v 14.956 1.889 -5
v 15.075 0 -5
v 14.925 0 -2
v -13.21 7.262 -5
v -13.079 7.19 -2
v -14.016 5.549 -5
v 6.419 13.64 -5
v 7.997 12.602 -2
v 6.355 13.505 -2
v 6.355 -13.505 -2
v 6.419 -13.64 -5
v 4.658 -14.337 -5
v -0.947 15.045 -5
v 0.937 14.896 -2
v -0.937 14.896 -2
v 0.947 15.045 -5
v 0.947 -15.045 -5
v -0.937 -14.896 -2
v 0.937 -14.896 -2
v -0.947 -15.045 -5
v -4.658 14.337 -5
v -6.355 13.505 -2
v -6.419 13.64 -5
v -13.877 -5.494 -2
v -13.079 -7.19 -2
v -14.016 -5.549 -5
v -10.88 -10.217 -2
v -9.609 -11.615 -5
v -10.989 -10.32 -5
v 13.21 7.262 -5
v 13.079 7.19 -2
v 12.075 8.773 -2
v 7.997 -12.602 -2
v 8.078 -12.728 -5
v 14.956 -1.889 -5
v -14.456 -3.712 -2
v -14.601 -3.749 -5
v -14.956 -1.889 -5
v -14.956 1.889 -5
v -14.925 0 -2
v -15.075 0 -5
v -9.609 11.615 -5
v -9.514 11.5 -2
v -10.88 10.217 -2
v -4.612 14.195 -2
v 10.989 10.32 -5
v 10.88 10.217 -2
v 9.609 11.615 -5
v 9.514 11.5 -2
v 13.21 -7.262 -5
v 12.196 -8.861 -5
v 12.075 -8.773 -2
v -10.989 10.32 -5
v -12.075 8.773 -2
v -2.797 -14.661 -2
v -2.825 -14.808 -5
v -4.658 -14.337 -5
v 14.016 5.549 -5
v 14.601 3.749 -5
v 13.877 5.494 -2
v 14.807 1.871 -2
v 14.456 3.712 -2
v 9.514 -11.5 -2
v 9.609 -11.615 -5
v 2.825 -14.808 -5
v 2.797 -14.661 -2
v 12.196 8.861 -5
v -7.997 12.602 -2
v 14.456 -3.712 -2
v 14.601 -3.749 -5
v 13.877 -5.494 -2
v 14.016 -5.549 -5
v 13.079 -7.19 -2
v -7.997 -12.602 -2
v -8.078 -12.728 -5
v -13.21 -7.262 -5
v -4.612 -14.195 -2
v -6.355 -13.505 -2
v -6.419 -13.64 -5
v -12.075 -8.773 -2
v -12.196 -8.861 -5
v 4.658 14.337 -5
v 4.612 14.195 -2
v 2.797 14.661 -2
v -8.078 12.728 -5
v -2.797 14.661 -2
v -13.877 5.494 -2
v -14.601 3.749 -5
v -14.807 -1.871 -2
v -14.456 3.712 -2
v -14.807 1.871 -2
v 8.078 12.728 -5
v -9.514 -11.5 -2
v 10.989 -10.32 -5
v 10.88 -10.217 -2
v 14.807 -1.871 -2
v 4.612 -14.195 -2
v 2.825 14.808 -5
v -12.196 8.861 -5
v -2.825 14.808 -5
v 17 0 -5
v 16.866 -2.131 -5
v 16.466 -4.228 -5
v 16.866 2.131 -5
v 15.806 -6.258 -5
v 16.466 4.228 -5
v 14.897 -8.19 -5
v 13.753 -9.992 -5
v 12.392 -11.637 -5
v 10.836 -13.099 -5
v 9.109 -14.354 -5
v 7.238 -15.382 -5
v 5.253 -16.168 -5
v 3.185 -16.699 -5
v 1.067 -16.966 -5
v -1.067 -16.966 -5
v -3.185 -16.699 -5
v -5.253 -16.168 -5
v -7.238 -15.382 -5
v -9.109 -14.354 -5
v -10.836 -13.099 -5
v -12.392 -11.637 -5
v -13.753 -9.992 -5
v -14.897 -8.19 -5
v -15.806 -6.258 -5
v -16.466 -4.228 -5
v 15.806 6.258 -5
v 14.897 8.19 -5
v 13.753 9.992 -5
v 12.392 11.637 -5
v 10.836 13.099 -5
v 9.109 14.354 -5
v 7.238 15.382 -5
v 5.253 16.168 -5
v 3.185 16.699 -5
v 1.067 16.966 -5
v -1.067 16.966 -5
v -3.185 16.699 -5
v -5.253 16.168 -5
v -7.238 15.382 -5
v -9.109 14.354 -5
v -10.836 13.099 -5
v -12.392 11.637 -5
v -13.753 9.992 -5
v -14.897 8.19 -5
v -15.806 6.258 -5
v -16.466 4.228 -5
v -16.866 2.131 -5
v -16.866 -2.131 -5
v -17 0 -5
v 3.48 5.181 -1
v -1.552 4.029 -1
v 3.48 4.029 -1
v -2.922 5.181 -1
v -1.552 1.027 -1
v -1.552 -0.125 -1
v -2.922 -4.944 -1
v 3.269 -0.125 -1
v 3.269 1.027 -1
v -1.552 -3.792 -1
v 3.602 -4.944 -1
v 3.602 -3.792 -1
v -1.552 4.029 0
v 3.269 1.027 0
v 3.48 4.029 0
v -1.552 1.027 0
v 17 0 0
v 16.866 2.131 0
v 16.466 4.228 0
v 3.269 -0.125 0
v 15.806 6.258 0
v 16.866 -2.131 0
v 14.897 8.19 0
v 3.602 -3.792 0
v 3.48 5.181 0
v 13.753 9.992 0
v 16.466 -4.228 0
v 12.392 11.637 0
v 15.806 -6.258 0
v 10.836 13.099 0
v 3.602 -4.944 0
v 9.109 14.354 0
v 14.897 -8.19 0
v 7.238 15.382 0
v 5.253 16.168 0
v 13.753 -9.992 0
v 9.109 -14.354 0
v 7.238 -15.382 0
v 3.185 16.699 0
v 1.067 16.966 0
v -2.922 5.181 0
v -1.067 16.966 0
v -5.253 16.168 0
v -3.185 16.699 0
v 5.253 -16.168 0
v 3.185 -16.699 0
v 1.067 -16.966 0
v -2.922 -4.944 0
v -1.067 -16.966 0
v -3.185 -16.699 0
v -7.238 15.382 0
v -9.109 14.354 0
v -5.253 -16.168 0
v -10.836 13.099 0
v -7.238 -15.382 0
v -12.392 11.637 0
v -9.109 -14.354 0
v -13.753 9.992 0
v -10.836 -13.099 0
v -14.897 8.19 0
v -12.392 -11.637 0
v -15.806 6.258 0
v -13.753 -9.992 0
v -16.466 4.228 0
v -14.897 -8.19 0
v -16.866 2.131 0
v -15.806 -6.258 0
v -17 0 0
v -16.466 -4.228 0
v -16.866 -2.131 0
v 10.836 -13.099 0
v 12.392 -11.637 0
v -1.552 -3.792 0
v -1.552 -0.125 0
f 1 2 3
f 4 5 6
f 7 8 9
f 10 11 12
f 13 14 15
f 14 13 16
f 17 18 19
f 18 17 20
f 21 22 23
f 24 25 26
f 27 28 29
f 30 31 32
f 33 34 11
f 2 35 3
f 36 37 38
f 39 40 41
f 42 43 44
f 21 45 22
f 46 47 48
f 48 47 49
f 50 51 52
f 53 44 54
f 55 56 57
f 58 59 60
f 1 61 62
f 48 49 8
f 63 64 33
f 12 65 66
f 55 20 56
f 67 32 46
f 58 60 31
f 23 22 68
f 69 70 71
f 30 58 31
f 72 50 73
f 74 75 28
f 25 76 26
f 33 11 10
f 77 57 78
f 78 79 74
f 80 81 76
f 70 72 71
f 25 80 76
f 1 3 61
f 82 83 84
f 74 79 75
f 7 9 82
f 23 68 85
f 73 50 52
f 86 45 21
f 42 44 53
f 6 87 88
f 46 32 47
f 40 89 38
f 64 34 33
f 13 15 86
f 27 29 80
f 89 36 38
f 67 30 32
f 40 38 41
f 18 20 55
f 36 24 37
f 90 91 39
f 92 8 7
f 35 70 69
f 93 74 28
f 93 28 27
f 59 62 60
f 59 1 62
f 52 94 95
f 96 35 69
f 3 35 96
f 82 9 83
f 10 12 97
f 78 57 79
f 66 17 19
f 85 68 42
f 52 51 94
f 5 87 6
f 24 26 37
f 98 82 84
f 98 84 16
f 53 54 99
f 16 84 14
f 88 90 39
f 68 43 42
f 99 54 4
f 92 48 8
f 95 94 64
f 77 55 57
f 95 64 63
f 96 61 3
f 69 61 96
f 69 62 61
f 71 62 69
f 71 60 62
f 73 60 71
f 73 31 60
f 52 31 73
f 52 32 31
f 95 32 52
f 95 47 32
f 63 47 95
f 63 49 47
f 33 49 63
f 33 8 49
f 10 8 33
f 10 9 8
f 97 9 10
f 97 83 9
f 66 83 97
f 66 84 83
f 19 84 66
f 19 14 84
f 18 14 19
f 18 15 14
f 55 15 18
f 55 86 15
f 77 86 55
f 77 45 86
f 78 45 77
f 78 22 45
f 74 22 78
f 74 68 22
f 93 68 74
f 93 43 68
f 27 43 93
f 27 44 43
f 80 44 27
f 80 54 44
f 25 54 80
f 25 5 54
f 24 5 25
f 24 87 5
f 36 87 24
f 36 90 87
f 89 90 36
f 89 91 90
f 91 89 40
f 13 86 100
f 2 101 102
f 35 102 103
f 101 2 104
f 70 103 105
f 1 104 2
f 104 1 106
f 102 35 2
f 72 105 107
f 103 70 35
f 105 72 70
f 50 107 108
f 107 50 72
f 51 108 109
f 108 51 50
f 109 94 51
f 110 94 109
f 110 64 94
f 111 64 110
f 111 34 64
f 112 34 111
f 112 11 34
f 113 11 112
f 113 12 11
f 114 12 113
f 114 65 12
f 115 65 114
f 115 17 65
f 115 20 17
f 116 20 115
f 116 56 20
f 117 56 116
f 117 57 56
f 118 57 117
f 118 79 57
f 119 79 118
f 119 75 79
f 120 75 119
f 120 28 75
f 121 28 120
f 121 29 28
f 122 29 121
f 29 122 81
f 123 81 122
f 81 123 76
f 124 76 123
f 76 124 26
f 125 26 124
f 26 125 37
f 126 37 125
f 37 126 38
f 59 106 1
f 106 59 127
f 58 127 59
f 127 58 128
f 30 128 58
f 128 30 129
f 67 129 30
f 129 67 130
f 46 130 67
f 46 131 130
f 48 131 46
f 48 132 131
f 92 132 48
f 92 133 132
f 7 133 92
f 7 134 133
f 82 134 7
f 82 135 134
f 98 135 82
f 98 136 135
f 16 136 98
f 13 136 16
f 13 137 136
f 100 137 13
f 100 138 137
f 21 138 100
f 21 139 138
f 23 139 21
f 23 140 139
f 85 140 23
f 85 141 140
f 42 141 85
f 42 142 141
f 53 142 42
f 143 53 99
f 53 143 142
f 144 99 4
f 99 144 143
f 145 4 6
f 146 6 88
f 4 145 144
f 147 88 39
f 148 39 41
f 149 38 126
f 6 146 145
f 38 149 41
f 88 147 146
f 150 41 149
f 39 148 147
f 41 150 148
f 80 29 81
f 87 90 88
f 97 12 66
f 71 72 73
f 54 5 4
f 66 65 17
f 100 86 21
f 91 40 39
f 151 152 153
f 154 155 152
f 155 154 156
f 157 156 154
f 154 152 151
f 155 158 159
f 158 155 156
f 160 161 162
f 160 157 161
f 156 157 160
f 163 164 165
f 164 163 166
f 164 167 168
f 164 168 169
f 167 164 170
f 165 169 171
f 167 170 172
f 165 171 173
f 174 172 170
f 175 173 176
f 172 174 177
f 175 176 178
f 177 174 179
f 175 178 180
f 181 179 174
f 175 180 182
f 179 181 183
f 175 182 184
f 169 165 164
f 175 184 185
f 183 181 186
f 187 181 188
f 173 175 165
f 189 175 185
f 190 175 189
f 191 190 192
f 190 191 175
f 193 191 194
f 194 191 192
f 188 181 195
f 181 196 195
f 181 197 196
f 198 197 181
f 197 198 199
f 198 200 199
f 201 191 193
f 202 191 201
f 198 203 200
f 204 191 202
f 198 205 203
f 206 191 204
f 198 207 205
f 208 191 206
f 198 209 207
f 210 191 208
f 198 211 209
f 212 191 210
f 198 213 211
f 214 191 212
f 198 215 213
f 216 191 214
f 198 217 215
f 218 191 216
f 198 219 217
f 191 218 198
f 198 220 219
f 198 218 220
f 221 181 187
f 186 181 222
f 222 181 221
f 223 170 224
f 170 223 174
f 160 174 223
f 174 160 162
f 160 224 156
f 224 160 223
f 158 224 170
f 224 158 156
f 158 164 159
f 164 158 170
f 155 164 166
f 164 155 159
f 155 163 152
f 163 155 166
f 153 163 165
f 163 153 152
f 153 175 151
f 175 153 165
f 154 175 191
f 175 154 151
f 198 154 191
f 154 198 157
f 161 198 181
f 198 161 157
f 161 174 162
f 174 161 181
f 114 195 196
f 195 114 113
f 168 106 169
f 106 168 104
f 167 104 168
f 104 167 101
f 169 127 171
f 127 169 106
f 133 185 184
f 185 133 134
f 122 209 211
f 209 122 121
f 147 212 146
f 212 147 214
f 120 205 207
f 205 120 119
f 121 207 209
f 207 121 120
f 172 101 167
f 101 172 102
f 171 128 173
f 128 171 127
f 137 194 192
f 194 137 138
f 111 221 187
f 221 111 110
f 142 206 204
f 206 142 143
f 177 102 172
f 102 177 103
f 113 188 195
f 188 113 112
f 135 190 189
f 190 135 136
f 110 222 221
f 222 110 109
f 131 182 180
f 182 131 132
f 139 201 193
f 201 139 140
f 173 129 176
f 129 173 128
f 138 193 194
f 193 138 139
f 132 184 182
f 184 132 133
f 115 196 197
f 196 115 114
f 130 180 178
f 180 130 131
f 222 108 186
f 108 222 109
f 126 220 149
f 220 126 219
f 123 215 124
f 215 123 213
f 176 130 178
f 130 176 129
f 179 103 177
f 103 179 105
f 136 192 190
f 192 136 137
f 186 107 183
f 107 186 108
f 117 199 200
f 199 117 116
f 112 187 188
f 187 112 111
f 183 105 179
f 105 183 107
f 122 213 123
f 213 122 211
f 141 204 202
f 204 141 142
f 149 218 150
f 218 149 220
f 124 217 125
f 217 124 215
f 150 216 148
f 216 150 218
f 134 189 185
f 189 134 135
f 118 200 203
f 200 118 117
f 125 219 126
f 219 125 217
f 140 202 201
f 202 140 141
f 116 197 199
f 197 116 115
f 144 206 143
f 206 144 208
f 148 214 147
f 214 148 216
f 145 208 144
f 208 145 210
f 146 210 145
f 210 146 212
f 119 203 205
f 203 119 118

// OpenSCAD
$fn = 50;

difference() {
	union() {
		translate(v = [0, 0, -5.0]) {
			cylinder(h = 5, r = 17.0);
		}
	}
	union() {
		#translate(v = [0, 0, -5.0]) {
			cylinder(h = 3, r1 = 15.075, r2 = 14.925);
		}
		translate(v = [0, 0, -1]) {
			linear_extrude(height = 1) {
				text(font = "Impact", halign = "center", size = 10, text = "E", valign = "center");
			}
		}
	}
}
